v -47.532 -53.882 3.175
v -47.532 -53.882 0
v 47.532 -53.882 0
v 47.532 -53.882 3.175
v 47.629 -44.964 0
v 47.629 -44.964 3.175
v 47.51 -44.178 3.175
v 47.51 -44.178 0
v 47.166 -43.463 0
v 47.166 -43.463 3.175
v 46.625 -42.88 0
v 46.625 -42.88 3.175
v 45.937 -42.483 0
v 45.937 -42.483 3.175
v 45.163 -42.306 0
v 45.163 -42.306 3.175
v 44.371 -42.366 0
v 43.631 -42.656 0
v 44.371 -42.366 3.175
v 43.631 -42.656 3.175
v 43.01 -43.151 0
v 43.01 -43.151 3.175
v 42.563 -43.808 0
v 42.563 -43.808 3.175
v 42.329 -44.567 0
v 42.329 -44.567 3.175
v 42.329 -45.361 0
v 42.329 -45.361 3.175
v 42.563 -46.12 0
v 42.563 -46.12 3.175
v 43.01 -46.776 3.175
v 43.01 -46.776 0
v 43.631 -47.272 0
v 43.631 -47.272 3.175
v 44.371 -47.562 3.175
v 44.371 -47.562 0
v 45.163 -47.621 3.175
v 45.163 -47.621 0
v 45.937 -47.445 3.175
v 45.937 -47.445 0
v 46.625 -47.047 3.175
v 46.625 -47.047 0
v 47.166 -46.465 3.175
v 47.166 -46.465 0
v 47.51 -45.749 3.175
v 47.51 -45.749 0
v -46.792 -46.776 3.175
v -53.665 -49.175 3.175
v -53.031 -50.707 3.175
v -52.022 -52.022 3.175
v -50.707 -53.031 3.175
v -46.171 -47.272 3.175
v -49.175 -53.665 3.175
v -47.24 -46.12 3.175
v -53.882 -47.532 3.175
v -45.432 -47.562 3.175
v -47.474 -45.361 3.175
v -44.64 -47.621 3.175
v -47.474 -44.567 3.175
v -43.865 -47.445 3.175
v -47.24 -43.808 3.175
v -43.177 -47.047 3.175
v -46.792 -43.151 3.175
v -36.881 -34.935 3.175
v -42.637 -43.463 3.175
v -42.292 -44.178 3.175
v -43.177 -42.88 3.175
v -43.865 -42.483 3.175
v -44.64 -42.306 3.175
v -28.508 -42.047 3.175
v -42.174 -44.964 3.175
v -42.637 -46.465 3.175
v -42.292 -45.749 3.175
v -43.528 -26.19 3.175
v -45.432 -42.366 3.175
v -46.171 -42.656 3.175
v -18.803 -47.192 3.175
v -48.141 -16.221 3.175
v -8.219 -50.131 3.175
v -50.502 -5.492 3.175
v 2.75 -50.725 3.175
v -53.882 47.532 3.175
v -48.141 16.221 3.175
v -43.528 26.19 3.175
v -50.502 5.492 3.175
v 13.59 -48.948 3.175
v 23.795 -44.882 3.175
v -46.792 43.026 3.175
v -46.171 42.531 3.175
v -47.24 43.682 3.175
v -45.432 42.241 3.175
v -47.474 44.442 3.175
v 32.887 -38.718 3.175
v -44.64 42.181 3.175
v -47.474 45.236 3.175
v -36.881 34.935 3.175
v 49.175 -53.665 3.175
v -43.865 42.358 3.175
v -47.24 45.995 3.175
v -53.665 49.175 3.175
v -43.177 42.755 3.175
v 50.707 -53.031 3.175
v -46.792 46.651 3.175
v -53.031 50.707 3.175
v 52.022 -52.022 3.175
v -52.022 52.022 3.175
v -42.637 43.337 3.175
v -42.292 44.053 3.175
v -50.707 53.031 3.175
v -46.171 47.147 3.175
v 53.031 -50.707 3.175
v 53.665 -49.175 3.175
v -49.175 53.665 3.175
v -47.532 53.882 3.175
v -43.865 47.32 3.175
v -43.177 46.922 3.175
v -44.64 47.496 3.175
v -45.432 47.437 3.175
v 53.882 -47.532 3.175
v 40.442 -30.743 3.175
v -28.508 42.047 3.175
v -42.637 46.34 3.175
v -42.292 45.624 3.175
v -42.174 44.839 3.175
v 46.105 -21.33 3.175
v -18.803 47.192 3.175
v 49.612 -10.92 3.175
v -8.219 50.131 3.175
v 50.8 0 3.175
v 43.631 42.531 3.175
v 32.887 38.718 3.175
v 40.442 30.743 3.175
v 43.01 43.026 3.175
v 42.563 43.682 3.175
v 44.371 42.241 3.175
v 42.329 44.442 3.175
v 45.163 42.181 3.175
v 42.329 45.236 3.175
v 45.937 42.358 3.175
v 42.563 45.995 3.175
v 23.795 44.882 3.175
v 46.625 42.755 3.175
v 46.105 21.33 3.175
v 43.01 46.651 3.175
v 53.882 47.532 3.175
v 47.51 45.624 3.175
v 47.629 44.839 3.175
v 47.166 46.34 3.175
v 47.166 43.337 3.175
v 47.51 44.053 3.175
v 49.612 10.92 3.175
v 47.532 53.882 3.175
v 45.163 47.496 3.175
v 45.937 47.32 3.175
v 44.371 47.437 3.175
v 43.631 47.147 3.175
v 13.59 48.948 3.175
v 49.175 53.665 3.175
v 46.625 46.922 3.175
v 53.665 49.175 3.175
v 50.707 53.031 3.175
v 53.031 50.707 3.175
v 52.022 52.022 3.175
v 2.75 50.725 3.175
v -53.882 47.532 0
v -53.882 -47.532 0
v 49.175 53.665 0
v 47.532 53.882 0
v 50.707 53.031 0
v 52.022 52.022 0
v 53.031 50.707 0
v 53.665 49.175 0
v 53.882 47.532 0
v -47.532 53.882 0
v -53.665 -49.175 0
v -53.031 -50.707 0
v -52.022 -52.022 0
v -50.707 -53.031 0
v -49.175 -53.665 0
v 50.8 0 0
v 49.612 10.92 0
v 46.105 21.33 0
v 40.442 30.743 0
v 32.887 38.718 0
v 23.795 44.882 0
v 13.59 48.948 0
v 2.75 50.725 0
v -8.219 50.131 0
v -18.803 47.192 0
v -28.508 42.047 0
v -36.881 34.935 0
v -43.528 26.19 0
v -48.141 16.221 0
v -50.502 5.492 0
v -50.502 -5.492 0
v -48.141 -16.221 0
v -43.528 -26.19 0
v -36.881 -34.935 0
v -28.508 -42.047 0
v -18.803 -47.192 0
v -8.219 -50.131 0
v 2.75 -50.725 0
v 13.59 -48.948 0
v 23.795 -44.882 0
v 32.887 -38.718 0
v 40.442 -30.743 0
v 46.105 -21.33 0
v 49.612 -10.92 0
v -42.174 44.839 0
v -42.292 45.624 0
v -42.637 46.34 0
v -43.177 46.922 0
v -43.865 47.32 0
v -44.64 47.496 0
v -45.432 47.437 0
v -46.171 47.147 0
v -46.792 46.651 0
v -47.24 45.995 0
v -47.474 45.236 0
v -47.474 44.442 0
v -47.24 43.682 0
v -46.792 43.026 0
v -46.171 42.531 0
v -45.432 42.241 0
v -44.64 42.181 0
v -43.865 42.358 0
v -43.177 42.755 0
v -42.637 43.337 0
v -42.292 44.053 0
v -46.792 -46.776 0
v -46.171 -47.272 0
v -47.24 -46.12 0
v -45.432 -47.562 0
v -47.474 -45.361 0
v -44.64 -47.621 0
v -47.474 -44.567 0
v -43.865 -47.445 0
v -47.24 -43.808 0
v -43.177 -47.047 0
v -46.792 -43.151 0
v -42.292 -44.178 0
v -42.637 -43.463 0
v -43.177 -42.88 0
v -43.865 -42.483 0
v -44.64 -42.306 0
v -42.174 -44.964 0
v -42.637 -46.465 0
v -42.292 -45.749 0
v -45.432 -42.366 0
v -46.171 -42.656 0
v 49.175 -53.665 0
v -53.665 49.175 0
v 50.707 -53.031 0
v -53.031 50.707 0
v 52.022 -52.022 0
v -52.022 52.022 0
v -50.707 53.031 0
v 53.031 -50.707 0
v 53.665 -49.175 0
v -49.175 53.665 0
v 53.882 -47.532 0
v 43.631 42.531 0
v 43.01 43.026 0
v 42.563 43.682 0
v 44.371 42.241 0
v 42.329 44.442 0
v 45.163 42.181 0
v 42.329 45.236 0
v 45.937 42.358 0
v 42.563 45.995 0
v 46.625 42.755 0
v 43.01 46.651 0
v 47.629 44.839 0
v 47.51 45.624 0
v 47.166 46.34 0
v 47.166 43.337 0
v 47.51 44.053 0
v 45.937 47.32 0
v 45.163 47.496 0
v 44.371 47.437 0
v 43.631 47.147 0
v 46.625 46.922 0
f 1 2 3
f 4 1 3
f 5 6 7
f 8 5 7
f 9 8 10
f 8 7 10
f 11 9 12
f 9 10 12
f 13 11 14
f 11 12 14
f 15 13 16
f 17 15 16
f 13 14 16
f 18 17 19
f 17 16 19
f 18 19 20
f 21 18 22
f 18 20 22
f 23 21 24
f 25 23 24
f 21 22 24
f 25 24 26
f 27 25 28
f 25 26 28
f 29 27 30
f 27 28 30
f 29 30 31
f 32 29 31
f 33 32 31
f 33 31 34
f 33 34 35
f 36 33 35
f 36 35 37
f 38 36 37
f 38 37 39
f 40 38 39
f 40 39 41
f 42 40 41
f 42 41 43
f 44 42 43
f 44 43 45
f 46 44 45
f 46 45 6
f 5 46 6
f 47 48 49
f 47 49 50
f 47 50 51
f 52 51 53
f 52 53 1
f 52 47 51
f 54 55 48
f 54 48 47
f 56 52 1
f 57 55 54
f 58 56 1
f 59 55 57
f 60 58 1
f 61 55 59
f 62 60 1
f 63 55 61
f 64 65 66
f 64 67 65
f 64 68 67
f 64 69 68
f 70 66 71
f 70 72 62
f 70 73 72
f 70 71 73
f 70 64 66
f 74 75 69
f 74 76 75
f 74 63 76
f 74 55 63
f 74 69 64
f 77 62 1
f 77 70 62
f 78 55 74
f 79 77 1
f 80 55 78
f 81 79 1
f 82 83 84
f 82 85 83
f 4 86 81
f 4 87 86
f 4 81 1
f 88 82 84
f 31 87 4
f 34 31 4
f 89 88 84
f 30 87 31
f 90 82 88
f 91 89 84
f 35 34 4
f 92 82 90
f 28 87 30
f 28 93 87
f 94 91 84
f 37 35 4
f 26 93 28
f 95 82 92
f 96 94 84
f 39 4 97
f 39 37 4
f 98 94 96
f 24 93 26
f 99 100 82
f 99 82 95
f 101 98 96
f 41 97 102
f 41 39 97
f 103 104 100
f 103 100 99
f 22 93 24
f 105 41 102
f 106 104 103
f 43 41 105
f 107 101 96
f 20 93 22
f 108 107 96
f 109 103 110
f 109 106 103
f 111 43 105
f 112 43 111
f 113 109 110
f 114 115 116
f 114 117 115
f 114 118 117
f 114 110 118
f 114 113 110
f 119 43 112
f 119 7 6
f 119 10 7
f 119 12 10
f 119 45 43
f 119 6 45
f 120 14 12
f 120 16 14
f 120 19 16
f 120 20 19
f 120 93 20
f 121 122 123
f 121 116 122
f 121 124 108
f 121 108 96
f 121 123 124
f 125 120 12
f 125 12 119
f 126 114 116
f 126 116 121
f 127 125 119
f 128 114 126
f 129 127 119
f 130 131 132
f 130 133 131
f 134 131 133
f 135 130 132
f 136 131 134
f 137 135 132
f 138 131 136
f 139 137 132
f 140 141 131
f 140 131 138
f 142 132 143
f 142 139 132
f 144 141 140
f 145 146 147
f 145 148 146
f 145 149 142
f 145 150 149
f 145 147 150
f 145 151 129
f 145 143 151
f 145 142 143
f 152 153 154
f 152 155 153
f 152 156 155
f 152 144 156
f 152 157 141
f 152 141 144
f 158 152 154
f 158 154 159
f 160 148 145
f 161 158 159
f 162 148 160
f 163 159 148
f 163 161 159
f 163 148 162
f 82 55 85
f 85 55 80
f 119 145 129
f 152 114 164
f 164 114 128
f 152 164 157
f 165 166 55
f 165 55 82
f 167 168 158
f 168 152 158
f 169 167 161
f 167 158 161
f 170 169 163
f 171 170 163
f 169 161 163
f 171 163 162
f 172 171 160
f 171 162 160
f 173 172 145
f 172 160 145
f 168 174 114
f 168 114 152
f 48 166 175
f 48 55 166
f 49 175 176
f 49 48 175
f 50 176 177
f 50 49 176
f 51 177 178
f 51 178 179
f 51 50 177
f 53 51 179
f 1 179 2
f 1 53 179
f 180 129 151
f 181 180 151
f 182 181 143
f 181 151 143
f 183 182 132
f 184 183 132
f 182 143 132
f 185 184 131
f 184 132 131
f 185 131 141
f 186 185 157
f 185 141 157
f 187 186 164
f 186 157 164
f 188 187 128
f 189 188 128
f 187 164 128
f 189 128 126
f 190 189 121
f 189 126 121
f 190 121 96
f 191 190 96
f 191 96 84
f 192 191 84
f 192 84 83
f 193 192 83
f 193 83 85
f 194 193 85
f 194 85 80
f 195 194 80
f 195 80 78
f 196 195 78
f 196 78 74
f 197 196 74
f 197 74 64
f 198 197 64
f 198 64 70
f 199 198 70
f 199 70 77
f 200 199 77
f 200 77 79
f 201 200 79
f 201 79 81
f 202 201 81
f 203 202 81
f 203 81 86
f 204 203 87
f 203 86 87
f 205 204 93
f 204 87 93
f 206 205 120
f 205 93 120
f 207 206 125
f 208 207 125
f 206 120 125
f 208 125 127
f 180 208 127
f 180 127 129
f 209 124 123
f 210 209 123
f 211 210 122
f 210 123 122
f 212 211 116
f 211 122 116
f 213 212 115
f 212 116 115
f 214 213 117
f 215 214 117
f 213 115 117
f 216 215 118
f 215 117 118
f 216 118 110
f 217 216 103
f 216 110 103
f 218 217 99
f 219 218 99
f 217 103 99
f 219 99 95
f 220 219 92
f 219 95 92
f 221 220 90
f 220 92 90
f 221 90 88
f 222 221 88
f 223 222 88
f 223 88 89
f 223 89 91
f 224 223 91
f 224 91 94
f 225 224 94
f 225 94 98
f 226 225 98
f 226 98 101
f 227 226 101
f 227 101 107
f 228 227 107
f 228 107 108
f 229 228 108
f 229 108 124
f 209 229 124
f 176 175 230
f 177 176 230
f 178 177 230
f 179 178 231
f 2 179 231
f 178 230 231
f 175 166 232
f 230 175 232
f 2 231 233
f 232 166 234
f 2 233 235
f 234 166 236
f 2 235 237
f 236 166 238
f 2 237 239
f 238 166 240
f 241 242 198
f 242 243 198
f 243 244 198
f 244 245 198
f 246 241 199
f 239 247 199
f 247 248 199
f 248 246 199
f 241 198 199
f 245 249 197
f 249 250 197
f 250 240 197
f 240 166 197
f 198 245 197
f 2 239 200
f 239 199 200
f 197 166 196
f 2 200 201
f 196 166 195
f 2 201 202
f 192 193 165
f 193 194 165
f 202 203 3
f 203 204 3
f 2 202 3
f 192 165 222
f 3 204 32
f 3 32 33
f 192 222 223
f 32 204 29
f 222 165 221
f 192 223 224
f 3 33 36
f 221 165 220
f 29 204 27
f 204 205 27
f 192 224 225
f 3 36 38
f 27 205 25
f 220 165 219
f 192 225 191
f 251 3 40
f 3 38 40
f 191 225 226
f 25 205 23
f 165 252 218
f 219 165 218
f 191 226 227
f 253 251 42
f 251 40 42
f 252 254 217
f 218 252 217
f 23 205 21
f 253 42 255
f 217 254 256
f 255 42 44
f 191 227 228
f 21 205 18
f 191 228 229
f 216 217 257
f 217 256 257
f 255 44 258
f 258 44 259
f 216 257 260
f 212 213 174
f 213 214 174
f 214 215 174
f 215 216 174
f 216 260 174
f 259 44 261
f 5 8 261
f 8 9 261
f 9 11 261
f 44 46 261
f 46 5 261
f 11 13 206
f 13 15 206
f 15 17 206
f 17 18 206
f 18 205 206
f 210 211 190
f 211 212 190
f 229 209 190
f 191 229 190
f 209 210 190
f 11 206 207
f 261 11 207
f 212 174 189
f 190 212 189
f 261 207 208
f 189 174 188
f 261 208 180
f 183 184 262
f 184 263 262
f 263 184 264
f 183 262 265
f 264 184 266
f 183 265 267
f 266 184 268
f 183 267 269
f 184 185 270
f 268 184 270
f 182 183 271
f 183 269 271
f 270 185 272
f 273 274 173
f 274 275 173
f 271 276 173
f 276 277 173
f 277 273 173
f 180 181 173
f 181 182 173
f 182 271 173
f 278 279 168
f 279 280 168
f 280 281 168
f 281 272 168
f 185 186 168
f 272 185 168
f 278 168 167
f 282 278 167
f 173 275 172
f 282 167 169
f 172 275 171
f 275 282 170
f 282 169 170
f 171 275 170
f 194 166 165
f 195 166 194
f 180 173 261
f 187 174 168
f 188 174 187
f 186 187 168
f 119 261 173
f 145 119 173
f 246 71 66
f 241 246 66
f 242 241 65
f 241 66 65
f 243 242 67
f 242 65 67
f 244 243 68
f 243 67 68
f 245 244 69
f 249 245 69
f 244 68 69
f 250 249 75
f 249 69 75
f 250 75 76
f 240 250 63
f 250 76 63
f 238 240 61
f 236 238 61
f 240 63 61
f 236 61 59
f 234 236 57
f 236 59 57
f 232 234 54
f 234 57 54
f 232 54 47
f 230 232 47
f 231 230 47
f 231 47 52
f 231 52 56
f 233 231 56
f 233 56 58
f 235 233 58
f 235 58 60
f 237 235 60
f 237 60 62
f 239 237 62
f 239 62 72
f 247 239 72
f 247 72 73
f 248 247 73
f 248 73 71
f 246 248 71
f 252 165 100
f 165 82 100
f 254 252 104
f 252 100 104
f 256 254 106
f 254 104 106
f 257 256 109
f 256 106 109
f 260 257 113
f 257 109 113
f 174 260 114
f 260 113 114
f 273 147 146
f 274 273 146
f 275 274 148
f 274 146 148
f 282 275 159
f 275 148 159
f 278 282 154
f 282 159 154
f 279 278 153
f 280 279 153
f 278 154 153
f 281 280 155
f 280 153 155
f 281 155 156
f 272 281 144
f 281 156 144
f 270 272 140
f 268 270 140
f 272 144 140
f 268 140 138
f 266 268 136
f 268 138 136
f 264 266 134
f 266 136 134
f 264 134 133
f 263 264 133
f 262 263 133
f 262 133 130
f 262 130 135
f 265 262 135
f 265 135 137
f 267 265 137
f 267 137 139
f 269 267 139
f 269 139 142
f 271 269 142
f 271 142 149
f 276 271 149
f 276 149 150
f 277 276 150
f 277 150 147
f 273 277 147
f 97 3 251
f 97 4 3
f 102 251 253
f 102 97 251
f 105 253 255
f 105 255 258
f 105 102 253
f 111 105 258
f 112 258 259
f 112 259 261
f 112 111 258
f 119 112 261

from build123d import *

# Parameters (mm, degrees)
SKETCH1_W           = 107.763073452
SKETCH1_H           = 107.763073452
BOSS_EXTRUDE1_DEPTH = 3.175
CUT_EXTRUDE2_REACH  = 78.266
SKETCH4_R           = 50.8
FILLET1_R           = 6.35
CUT_EXTRUDE3_REACH  = 78.266
SKETCH5_R           = 2.665000004


with BuildPart() as part:
    # Sketch1 → Boss-Extrude1 (new body)
    with BuildSketch(Plane.XY):
        Rectangle(SKETCH1_W, SKETCH1_H)
    extrude(amount=BOSS_EXTRUDE1_DEPTH)

    # Sketch4 → Cut-Extrude2 (cut, up to next)
    with BuildSketch(Plane.XY.offset(3.175), mode=Mode.PRIVATE) as cut_extrude2_sk1:
        Circle(SKETCH4_R)
    cut_extrude2_tool1 = extrude(cut_extrude2_sk1.sketch, amount=-CUT_EXTRUDE2_REACH, mode=Mode.PRIVATE) & part.part
    add(cut_extrude2_tool1.solids().sort_by_distance((0, 0, 3.175))[0], mode=Mode.SUBTRACT)

    # Fillet1
    fillet1_edges = [part.edges().sort_by_distance(p)[0] for p in [
        (-53.881536726, -53.881536726, 1.5875),
        (-53.881536726, 53.881536726, 1.5875),
        (53.881536726, 53.881536726, 1.5875),
        (53.881536726, -53.881536726, 1.5875),
    ]]
    fillet(fillet1_edges, radius=FILLET1_R)

    # Sketch5 → Cut-Extrude3 (cut, up to next)
    with BuildSketch(Plane.XY.offset(3.175), mode=Mode.PRIVATE) as cut_extrude3_sk1:
        with Locations((-44.838745817, 44.838745817)):
            Circle(SKETCH5_R)
    cut_extrude3_tool1 = extrude(cut_extrude3_sk1.sketch, amount=-CUT_EXTRUDE3_REACH, mode=Mode.PRIVATE) & part.part
    # Sketch5 → Cut-Extrude3 (cut, up to next)
    with BuildSketch(Plane.XY.offset(3.175), mode=Mode.PRIVATE) as cut_extrude3_sk2:
        with Locations((44.963815393, 44.838745817)):
            Circle(SKETCH5_R)
    cut_extrude3_tool2 = extrude(cut_extrude3_sk2.sketch, amount=-CUT_EXTRUDE3_REACH, mode=Mode.PRIVATE) & part.part
    # Sketch5 → Cut-Extrude3 (cut, up to next)
    with BuildSketch(Plane.XY.offset(3.175), mode=Mode.PRIVATE) as cut_extrude3_sk3:
        with Locations((-44.838745817, -44.963815393)):
            Circle(SKETCH5_R)
    cut_extrude3_tool3 = extrude(cut_extrude3_sk3.sketch, amount=-CUT_EXTRUDE3_REACH, mode=Mode.PRIVATE) & part.part
    # Sketch5 → Cut-Extrude3 (cut, up to next)
    with BuildSketch(Plane.XY.offset(3.175), mode=Mode.PRIVATE) as cut_extrude3_sk4:
        with Locations((44.963815393, -44.963815393)):
            Circle(SKETCH5_R)
    cut_extrude3_tool4 = extrude(cut_extrude3_sk4.sketch, amount=-CUT_EXTRUDE3_REACH, mode=Mode.PRIVATE) & part.part
    add(cut_extrude3_tool1.solids().sort_by_distance((-44.838746, 44.838746, 3.175))[0], mode=Mode.SUBTRACT)
    add(cut_extrude3_tool2.solids().sort_by_distance((44.963815, 44.838746, 3.175))[0], mode=Mode.SUBTRACT)
    add(cut_extrude3_tool3.solids().sort_by_distance((-44.838746, -44.963815, 3.175))[0], mode=Mode.SUBTRACT)
    add(cut_extrude3_tool4.solids().sort_by_distance((44.963815, -44.963815, 3.175))[0], mode=Mode.SUBTRACT)


solid = part.part
